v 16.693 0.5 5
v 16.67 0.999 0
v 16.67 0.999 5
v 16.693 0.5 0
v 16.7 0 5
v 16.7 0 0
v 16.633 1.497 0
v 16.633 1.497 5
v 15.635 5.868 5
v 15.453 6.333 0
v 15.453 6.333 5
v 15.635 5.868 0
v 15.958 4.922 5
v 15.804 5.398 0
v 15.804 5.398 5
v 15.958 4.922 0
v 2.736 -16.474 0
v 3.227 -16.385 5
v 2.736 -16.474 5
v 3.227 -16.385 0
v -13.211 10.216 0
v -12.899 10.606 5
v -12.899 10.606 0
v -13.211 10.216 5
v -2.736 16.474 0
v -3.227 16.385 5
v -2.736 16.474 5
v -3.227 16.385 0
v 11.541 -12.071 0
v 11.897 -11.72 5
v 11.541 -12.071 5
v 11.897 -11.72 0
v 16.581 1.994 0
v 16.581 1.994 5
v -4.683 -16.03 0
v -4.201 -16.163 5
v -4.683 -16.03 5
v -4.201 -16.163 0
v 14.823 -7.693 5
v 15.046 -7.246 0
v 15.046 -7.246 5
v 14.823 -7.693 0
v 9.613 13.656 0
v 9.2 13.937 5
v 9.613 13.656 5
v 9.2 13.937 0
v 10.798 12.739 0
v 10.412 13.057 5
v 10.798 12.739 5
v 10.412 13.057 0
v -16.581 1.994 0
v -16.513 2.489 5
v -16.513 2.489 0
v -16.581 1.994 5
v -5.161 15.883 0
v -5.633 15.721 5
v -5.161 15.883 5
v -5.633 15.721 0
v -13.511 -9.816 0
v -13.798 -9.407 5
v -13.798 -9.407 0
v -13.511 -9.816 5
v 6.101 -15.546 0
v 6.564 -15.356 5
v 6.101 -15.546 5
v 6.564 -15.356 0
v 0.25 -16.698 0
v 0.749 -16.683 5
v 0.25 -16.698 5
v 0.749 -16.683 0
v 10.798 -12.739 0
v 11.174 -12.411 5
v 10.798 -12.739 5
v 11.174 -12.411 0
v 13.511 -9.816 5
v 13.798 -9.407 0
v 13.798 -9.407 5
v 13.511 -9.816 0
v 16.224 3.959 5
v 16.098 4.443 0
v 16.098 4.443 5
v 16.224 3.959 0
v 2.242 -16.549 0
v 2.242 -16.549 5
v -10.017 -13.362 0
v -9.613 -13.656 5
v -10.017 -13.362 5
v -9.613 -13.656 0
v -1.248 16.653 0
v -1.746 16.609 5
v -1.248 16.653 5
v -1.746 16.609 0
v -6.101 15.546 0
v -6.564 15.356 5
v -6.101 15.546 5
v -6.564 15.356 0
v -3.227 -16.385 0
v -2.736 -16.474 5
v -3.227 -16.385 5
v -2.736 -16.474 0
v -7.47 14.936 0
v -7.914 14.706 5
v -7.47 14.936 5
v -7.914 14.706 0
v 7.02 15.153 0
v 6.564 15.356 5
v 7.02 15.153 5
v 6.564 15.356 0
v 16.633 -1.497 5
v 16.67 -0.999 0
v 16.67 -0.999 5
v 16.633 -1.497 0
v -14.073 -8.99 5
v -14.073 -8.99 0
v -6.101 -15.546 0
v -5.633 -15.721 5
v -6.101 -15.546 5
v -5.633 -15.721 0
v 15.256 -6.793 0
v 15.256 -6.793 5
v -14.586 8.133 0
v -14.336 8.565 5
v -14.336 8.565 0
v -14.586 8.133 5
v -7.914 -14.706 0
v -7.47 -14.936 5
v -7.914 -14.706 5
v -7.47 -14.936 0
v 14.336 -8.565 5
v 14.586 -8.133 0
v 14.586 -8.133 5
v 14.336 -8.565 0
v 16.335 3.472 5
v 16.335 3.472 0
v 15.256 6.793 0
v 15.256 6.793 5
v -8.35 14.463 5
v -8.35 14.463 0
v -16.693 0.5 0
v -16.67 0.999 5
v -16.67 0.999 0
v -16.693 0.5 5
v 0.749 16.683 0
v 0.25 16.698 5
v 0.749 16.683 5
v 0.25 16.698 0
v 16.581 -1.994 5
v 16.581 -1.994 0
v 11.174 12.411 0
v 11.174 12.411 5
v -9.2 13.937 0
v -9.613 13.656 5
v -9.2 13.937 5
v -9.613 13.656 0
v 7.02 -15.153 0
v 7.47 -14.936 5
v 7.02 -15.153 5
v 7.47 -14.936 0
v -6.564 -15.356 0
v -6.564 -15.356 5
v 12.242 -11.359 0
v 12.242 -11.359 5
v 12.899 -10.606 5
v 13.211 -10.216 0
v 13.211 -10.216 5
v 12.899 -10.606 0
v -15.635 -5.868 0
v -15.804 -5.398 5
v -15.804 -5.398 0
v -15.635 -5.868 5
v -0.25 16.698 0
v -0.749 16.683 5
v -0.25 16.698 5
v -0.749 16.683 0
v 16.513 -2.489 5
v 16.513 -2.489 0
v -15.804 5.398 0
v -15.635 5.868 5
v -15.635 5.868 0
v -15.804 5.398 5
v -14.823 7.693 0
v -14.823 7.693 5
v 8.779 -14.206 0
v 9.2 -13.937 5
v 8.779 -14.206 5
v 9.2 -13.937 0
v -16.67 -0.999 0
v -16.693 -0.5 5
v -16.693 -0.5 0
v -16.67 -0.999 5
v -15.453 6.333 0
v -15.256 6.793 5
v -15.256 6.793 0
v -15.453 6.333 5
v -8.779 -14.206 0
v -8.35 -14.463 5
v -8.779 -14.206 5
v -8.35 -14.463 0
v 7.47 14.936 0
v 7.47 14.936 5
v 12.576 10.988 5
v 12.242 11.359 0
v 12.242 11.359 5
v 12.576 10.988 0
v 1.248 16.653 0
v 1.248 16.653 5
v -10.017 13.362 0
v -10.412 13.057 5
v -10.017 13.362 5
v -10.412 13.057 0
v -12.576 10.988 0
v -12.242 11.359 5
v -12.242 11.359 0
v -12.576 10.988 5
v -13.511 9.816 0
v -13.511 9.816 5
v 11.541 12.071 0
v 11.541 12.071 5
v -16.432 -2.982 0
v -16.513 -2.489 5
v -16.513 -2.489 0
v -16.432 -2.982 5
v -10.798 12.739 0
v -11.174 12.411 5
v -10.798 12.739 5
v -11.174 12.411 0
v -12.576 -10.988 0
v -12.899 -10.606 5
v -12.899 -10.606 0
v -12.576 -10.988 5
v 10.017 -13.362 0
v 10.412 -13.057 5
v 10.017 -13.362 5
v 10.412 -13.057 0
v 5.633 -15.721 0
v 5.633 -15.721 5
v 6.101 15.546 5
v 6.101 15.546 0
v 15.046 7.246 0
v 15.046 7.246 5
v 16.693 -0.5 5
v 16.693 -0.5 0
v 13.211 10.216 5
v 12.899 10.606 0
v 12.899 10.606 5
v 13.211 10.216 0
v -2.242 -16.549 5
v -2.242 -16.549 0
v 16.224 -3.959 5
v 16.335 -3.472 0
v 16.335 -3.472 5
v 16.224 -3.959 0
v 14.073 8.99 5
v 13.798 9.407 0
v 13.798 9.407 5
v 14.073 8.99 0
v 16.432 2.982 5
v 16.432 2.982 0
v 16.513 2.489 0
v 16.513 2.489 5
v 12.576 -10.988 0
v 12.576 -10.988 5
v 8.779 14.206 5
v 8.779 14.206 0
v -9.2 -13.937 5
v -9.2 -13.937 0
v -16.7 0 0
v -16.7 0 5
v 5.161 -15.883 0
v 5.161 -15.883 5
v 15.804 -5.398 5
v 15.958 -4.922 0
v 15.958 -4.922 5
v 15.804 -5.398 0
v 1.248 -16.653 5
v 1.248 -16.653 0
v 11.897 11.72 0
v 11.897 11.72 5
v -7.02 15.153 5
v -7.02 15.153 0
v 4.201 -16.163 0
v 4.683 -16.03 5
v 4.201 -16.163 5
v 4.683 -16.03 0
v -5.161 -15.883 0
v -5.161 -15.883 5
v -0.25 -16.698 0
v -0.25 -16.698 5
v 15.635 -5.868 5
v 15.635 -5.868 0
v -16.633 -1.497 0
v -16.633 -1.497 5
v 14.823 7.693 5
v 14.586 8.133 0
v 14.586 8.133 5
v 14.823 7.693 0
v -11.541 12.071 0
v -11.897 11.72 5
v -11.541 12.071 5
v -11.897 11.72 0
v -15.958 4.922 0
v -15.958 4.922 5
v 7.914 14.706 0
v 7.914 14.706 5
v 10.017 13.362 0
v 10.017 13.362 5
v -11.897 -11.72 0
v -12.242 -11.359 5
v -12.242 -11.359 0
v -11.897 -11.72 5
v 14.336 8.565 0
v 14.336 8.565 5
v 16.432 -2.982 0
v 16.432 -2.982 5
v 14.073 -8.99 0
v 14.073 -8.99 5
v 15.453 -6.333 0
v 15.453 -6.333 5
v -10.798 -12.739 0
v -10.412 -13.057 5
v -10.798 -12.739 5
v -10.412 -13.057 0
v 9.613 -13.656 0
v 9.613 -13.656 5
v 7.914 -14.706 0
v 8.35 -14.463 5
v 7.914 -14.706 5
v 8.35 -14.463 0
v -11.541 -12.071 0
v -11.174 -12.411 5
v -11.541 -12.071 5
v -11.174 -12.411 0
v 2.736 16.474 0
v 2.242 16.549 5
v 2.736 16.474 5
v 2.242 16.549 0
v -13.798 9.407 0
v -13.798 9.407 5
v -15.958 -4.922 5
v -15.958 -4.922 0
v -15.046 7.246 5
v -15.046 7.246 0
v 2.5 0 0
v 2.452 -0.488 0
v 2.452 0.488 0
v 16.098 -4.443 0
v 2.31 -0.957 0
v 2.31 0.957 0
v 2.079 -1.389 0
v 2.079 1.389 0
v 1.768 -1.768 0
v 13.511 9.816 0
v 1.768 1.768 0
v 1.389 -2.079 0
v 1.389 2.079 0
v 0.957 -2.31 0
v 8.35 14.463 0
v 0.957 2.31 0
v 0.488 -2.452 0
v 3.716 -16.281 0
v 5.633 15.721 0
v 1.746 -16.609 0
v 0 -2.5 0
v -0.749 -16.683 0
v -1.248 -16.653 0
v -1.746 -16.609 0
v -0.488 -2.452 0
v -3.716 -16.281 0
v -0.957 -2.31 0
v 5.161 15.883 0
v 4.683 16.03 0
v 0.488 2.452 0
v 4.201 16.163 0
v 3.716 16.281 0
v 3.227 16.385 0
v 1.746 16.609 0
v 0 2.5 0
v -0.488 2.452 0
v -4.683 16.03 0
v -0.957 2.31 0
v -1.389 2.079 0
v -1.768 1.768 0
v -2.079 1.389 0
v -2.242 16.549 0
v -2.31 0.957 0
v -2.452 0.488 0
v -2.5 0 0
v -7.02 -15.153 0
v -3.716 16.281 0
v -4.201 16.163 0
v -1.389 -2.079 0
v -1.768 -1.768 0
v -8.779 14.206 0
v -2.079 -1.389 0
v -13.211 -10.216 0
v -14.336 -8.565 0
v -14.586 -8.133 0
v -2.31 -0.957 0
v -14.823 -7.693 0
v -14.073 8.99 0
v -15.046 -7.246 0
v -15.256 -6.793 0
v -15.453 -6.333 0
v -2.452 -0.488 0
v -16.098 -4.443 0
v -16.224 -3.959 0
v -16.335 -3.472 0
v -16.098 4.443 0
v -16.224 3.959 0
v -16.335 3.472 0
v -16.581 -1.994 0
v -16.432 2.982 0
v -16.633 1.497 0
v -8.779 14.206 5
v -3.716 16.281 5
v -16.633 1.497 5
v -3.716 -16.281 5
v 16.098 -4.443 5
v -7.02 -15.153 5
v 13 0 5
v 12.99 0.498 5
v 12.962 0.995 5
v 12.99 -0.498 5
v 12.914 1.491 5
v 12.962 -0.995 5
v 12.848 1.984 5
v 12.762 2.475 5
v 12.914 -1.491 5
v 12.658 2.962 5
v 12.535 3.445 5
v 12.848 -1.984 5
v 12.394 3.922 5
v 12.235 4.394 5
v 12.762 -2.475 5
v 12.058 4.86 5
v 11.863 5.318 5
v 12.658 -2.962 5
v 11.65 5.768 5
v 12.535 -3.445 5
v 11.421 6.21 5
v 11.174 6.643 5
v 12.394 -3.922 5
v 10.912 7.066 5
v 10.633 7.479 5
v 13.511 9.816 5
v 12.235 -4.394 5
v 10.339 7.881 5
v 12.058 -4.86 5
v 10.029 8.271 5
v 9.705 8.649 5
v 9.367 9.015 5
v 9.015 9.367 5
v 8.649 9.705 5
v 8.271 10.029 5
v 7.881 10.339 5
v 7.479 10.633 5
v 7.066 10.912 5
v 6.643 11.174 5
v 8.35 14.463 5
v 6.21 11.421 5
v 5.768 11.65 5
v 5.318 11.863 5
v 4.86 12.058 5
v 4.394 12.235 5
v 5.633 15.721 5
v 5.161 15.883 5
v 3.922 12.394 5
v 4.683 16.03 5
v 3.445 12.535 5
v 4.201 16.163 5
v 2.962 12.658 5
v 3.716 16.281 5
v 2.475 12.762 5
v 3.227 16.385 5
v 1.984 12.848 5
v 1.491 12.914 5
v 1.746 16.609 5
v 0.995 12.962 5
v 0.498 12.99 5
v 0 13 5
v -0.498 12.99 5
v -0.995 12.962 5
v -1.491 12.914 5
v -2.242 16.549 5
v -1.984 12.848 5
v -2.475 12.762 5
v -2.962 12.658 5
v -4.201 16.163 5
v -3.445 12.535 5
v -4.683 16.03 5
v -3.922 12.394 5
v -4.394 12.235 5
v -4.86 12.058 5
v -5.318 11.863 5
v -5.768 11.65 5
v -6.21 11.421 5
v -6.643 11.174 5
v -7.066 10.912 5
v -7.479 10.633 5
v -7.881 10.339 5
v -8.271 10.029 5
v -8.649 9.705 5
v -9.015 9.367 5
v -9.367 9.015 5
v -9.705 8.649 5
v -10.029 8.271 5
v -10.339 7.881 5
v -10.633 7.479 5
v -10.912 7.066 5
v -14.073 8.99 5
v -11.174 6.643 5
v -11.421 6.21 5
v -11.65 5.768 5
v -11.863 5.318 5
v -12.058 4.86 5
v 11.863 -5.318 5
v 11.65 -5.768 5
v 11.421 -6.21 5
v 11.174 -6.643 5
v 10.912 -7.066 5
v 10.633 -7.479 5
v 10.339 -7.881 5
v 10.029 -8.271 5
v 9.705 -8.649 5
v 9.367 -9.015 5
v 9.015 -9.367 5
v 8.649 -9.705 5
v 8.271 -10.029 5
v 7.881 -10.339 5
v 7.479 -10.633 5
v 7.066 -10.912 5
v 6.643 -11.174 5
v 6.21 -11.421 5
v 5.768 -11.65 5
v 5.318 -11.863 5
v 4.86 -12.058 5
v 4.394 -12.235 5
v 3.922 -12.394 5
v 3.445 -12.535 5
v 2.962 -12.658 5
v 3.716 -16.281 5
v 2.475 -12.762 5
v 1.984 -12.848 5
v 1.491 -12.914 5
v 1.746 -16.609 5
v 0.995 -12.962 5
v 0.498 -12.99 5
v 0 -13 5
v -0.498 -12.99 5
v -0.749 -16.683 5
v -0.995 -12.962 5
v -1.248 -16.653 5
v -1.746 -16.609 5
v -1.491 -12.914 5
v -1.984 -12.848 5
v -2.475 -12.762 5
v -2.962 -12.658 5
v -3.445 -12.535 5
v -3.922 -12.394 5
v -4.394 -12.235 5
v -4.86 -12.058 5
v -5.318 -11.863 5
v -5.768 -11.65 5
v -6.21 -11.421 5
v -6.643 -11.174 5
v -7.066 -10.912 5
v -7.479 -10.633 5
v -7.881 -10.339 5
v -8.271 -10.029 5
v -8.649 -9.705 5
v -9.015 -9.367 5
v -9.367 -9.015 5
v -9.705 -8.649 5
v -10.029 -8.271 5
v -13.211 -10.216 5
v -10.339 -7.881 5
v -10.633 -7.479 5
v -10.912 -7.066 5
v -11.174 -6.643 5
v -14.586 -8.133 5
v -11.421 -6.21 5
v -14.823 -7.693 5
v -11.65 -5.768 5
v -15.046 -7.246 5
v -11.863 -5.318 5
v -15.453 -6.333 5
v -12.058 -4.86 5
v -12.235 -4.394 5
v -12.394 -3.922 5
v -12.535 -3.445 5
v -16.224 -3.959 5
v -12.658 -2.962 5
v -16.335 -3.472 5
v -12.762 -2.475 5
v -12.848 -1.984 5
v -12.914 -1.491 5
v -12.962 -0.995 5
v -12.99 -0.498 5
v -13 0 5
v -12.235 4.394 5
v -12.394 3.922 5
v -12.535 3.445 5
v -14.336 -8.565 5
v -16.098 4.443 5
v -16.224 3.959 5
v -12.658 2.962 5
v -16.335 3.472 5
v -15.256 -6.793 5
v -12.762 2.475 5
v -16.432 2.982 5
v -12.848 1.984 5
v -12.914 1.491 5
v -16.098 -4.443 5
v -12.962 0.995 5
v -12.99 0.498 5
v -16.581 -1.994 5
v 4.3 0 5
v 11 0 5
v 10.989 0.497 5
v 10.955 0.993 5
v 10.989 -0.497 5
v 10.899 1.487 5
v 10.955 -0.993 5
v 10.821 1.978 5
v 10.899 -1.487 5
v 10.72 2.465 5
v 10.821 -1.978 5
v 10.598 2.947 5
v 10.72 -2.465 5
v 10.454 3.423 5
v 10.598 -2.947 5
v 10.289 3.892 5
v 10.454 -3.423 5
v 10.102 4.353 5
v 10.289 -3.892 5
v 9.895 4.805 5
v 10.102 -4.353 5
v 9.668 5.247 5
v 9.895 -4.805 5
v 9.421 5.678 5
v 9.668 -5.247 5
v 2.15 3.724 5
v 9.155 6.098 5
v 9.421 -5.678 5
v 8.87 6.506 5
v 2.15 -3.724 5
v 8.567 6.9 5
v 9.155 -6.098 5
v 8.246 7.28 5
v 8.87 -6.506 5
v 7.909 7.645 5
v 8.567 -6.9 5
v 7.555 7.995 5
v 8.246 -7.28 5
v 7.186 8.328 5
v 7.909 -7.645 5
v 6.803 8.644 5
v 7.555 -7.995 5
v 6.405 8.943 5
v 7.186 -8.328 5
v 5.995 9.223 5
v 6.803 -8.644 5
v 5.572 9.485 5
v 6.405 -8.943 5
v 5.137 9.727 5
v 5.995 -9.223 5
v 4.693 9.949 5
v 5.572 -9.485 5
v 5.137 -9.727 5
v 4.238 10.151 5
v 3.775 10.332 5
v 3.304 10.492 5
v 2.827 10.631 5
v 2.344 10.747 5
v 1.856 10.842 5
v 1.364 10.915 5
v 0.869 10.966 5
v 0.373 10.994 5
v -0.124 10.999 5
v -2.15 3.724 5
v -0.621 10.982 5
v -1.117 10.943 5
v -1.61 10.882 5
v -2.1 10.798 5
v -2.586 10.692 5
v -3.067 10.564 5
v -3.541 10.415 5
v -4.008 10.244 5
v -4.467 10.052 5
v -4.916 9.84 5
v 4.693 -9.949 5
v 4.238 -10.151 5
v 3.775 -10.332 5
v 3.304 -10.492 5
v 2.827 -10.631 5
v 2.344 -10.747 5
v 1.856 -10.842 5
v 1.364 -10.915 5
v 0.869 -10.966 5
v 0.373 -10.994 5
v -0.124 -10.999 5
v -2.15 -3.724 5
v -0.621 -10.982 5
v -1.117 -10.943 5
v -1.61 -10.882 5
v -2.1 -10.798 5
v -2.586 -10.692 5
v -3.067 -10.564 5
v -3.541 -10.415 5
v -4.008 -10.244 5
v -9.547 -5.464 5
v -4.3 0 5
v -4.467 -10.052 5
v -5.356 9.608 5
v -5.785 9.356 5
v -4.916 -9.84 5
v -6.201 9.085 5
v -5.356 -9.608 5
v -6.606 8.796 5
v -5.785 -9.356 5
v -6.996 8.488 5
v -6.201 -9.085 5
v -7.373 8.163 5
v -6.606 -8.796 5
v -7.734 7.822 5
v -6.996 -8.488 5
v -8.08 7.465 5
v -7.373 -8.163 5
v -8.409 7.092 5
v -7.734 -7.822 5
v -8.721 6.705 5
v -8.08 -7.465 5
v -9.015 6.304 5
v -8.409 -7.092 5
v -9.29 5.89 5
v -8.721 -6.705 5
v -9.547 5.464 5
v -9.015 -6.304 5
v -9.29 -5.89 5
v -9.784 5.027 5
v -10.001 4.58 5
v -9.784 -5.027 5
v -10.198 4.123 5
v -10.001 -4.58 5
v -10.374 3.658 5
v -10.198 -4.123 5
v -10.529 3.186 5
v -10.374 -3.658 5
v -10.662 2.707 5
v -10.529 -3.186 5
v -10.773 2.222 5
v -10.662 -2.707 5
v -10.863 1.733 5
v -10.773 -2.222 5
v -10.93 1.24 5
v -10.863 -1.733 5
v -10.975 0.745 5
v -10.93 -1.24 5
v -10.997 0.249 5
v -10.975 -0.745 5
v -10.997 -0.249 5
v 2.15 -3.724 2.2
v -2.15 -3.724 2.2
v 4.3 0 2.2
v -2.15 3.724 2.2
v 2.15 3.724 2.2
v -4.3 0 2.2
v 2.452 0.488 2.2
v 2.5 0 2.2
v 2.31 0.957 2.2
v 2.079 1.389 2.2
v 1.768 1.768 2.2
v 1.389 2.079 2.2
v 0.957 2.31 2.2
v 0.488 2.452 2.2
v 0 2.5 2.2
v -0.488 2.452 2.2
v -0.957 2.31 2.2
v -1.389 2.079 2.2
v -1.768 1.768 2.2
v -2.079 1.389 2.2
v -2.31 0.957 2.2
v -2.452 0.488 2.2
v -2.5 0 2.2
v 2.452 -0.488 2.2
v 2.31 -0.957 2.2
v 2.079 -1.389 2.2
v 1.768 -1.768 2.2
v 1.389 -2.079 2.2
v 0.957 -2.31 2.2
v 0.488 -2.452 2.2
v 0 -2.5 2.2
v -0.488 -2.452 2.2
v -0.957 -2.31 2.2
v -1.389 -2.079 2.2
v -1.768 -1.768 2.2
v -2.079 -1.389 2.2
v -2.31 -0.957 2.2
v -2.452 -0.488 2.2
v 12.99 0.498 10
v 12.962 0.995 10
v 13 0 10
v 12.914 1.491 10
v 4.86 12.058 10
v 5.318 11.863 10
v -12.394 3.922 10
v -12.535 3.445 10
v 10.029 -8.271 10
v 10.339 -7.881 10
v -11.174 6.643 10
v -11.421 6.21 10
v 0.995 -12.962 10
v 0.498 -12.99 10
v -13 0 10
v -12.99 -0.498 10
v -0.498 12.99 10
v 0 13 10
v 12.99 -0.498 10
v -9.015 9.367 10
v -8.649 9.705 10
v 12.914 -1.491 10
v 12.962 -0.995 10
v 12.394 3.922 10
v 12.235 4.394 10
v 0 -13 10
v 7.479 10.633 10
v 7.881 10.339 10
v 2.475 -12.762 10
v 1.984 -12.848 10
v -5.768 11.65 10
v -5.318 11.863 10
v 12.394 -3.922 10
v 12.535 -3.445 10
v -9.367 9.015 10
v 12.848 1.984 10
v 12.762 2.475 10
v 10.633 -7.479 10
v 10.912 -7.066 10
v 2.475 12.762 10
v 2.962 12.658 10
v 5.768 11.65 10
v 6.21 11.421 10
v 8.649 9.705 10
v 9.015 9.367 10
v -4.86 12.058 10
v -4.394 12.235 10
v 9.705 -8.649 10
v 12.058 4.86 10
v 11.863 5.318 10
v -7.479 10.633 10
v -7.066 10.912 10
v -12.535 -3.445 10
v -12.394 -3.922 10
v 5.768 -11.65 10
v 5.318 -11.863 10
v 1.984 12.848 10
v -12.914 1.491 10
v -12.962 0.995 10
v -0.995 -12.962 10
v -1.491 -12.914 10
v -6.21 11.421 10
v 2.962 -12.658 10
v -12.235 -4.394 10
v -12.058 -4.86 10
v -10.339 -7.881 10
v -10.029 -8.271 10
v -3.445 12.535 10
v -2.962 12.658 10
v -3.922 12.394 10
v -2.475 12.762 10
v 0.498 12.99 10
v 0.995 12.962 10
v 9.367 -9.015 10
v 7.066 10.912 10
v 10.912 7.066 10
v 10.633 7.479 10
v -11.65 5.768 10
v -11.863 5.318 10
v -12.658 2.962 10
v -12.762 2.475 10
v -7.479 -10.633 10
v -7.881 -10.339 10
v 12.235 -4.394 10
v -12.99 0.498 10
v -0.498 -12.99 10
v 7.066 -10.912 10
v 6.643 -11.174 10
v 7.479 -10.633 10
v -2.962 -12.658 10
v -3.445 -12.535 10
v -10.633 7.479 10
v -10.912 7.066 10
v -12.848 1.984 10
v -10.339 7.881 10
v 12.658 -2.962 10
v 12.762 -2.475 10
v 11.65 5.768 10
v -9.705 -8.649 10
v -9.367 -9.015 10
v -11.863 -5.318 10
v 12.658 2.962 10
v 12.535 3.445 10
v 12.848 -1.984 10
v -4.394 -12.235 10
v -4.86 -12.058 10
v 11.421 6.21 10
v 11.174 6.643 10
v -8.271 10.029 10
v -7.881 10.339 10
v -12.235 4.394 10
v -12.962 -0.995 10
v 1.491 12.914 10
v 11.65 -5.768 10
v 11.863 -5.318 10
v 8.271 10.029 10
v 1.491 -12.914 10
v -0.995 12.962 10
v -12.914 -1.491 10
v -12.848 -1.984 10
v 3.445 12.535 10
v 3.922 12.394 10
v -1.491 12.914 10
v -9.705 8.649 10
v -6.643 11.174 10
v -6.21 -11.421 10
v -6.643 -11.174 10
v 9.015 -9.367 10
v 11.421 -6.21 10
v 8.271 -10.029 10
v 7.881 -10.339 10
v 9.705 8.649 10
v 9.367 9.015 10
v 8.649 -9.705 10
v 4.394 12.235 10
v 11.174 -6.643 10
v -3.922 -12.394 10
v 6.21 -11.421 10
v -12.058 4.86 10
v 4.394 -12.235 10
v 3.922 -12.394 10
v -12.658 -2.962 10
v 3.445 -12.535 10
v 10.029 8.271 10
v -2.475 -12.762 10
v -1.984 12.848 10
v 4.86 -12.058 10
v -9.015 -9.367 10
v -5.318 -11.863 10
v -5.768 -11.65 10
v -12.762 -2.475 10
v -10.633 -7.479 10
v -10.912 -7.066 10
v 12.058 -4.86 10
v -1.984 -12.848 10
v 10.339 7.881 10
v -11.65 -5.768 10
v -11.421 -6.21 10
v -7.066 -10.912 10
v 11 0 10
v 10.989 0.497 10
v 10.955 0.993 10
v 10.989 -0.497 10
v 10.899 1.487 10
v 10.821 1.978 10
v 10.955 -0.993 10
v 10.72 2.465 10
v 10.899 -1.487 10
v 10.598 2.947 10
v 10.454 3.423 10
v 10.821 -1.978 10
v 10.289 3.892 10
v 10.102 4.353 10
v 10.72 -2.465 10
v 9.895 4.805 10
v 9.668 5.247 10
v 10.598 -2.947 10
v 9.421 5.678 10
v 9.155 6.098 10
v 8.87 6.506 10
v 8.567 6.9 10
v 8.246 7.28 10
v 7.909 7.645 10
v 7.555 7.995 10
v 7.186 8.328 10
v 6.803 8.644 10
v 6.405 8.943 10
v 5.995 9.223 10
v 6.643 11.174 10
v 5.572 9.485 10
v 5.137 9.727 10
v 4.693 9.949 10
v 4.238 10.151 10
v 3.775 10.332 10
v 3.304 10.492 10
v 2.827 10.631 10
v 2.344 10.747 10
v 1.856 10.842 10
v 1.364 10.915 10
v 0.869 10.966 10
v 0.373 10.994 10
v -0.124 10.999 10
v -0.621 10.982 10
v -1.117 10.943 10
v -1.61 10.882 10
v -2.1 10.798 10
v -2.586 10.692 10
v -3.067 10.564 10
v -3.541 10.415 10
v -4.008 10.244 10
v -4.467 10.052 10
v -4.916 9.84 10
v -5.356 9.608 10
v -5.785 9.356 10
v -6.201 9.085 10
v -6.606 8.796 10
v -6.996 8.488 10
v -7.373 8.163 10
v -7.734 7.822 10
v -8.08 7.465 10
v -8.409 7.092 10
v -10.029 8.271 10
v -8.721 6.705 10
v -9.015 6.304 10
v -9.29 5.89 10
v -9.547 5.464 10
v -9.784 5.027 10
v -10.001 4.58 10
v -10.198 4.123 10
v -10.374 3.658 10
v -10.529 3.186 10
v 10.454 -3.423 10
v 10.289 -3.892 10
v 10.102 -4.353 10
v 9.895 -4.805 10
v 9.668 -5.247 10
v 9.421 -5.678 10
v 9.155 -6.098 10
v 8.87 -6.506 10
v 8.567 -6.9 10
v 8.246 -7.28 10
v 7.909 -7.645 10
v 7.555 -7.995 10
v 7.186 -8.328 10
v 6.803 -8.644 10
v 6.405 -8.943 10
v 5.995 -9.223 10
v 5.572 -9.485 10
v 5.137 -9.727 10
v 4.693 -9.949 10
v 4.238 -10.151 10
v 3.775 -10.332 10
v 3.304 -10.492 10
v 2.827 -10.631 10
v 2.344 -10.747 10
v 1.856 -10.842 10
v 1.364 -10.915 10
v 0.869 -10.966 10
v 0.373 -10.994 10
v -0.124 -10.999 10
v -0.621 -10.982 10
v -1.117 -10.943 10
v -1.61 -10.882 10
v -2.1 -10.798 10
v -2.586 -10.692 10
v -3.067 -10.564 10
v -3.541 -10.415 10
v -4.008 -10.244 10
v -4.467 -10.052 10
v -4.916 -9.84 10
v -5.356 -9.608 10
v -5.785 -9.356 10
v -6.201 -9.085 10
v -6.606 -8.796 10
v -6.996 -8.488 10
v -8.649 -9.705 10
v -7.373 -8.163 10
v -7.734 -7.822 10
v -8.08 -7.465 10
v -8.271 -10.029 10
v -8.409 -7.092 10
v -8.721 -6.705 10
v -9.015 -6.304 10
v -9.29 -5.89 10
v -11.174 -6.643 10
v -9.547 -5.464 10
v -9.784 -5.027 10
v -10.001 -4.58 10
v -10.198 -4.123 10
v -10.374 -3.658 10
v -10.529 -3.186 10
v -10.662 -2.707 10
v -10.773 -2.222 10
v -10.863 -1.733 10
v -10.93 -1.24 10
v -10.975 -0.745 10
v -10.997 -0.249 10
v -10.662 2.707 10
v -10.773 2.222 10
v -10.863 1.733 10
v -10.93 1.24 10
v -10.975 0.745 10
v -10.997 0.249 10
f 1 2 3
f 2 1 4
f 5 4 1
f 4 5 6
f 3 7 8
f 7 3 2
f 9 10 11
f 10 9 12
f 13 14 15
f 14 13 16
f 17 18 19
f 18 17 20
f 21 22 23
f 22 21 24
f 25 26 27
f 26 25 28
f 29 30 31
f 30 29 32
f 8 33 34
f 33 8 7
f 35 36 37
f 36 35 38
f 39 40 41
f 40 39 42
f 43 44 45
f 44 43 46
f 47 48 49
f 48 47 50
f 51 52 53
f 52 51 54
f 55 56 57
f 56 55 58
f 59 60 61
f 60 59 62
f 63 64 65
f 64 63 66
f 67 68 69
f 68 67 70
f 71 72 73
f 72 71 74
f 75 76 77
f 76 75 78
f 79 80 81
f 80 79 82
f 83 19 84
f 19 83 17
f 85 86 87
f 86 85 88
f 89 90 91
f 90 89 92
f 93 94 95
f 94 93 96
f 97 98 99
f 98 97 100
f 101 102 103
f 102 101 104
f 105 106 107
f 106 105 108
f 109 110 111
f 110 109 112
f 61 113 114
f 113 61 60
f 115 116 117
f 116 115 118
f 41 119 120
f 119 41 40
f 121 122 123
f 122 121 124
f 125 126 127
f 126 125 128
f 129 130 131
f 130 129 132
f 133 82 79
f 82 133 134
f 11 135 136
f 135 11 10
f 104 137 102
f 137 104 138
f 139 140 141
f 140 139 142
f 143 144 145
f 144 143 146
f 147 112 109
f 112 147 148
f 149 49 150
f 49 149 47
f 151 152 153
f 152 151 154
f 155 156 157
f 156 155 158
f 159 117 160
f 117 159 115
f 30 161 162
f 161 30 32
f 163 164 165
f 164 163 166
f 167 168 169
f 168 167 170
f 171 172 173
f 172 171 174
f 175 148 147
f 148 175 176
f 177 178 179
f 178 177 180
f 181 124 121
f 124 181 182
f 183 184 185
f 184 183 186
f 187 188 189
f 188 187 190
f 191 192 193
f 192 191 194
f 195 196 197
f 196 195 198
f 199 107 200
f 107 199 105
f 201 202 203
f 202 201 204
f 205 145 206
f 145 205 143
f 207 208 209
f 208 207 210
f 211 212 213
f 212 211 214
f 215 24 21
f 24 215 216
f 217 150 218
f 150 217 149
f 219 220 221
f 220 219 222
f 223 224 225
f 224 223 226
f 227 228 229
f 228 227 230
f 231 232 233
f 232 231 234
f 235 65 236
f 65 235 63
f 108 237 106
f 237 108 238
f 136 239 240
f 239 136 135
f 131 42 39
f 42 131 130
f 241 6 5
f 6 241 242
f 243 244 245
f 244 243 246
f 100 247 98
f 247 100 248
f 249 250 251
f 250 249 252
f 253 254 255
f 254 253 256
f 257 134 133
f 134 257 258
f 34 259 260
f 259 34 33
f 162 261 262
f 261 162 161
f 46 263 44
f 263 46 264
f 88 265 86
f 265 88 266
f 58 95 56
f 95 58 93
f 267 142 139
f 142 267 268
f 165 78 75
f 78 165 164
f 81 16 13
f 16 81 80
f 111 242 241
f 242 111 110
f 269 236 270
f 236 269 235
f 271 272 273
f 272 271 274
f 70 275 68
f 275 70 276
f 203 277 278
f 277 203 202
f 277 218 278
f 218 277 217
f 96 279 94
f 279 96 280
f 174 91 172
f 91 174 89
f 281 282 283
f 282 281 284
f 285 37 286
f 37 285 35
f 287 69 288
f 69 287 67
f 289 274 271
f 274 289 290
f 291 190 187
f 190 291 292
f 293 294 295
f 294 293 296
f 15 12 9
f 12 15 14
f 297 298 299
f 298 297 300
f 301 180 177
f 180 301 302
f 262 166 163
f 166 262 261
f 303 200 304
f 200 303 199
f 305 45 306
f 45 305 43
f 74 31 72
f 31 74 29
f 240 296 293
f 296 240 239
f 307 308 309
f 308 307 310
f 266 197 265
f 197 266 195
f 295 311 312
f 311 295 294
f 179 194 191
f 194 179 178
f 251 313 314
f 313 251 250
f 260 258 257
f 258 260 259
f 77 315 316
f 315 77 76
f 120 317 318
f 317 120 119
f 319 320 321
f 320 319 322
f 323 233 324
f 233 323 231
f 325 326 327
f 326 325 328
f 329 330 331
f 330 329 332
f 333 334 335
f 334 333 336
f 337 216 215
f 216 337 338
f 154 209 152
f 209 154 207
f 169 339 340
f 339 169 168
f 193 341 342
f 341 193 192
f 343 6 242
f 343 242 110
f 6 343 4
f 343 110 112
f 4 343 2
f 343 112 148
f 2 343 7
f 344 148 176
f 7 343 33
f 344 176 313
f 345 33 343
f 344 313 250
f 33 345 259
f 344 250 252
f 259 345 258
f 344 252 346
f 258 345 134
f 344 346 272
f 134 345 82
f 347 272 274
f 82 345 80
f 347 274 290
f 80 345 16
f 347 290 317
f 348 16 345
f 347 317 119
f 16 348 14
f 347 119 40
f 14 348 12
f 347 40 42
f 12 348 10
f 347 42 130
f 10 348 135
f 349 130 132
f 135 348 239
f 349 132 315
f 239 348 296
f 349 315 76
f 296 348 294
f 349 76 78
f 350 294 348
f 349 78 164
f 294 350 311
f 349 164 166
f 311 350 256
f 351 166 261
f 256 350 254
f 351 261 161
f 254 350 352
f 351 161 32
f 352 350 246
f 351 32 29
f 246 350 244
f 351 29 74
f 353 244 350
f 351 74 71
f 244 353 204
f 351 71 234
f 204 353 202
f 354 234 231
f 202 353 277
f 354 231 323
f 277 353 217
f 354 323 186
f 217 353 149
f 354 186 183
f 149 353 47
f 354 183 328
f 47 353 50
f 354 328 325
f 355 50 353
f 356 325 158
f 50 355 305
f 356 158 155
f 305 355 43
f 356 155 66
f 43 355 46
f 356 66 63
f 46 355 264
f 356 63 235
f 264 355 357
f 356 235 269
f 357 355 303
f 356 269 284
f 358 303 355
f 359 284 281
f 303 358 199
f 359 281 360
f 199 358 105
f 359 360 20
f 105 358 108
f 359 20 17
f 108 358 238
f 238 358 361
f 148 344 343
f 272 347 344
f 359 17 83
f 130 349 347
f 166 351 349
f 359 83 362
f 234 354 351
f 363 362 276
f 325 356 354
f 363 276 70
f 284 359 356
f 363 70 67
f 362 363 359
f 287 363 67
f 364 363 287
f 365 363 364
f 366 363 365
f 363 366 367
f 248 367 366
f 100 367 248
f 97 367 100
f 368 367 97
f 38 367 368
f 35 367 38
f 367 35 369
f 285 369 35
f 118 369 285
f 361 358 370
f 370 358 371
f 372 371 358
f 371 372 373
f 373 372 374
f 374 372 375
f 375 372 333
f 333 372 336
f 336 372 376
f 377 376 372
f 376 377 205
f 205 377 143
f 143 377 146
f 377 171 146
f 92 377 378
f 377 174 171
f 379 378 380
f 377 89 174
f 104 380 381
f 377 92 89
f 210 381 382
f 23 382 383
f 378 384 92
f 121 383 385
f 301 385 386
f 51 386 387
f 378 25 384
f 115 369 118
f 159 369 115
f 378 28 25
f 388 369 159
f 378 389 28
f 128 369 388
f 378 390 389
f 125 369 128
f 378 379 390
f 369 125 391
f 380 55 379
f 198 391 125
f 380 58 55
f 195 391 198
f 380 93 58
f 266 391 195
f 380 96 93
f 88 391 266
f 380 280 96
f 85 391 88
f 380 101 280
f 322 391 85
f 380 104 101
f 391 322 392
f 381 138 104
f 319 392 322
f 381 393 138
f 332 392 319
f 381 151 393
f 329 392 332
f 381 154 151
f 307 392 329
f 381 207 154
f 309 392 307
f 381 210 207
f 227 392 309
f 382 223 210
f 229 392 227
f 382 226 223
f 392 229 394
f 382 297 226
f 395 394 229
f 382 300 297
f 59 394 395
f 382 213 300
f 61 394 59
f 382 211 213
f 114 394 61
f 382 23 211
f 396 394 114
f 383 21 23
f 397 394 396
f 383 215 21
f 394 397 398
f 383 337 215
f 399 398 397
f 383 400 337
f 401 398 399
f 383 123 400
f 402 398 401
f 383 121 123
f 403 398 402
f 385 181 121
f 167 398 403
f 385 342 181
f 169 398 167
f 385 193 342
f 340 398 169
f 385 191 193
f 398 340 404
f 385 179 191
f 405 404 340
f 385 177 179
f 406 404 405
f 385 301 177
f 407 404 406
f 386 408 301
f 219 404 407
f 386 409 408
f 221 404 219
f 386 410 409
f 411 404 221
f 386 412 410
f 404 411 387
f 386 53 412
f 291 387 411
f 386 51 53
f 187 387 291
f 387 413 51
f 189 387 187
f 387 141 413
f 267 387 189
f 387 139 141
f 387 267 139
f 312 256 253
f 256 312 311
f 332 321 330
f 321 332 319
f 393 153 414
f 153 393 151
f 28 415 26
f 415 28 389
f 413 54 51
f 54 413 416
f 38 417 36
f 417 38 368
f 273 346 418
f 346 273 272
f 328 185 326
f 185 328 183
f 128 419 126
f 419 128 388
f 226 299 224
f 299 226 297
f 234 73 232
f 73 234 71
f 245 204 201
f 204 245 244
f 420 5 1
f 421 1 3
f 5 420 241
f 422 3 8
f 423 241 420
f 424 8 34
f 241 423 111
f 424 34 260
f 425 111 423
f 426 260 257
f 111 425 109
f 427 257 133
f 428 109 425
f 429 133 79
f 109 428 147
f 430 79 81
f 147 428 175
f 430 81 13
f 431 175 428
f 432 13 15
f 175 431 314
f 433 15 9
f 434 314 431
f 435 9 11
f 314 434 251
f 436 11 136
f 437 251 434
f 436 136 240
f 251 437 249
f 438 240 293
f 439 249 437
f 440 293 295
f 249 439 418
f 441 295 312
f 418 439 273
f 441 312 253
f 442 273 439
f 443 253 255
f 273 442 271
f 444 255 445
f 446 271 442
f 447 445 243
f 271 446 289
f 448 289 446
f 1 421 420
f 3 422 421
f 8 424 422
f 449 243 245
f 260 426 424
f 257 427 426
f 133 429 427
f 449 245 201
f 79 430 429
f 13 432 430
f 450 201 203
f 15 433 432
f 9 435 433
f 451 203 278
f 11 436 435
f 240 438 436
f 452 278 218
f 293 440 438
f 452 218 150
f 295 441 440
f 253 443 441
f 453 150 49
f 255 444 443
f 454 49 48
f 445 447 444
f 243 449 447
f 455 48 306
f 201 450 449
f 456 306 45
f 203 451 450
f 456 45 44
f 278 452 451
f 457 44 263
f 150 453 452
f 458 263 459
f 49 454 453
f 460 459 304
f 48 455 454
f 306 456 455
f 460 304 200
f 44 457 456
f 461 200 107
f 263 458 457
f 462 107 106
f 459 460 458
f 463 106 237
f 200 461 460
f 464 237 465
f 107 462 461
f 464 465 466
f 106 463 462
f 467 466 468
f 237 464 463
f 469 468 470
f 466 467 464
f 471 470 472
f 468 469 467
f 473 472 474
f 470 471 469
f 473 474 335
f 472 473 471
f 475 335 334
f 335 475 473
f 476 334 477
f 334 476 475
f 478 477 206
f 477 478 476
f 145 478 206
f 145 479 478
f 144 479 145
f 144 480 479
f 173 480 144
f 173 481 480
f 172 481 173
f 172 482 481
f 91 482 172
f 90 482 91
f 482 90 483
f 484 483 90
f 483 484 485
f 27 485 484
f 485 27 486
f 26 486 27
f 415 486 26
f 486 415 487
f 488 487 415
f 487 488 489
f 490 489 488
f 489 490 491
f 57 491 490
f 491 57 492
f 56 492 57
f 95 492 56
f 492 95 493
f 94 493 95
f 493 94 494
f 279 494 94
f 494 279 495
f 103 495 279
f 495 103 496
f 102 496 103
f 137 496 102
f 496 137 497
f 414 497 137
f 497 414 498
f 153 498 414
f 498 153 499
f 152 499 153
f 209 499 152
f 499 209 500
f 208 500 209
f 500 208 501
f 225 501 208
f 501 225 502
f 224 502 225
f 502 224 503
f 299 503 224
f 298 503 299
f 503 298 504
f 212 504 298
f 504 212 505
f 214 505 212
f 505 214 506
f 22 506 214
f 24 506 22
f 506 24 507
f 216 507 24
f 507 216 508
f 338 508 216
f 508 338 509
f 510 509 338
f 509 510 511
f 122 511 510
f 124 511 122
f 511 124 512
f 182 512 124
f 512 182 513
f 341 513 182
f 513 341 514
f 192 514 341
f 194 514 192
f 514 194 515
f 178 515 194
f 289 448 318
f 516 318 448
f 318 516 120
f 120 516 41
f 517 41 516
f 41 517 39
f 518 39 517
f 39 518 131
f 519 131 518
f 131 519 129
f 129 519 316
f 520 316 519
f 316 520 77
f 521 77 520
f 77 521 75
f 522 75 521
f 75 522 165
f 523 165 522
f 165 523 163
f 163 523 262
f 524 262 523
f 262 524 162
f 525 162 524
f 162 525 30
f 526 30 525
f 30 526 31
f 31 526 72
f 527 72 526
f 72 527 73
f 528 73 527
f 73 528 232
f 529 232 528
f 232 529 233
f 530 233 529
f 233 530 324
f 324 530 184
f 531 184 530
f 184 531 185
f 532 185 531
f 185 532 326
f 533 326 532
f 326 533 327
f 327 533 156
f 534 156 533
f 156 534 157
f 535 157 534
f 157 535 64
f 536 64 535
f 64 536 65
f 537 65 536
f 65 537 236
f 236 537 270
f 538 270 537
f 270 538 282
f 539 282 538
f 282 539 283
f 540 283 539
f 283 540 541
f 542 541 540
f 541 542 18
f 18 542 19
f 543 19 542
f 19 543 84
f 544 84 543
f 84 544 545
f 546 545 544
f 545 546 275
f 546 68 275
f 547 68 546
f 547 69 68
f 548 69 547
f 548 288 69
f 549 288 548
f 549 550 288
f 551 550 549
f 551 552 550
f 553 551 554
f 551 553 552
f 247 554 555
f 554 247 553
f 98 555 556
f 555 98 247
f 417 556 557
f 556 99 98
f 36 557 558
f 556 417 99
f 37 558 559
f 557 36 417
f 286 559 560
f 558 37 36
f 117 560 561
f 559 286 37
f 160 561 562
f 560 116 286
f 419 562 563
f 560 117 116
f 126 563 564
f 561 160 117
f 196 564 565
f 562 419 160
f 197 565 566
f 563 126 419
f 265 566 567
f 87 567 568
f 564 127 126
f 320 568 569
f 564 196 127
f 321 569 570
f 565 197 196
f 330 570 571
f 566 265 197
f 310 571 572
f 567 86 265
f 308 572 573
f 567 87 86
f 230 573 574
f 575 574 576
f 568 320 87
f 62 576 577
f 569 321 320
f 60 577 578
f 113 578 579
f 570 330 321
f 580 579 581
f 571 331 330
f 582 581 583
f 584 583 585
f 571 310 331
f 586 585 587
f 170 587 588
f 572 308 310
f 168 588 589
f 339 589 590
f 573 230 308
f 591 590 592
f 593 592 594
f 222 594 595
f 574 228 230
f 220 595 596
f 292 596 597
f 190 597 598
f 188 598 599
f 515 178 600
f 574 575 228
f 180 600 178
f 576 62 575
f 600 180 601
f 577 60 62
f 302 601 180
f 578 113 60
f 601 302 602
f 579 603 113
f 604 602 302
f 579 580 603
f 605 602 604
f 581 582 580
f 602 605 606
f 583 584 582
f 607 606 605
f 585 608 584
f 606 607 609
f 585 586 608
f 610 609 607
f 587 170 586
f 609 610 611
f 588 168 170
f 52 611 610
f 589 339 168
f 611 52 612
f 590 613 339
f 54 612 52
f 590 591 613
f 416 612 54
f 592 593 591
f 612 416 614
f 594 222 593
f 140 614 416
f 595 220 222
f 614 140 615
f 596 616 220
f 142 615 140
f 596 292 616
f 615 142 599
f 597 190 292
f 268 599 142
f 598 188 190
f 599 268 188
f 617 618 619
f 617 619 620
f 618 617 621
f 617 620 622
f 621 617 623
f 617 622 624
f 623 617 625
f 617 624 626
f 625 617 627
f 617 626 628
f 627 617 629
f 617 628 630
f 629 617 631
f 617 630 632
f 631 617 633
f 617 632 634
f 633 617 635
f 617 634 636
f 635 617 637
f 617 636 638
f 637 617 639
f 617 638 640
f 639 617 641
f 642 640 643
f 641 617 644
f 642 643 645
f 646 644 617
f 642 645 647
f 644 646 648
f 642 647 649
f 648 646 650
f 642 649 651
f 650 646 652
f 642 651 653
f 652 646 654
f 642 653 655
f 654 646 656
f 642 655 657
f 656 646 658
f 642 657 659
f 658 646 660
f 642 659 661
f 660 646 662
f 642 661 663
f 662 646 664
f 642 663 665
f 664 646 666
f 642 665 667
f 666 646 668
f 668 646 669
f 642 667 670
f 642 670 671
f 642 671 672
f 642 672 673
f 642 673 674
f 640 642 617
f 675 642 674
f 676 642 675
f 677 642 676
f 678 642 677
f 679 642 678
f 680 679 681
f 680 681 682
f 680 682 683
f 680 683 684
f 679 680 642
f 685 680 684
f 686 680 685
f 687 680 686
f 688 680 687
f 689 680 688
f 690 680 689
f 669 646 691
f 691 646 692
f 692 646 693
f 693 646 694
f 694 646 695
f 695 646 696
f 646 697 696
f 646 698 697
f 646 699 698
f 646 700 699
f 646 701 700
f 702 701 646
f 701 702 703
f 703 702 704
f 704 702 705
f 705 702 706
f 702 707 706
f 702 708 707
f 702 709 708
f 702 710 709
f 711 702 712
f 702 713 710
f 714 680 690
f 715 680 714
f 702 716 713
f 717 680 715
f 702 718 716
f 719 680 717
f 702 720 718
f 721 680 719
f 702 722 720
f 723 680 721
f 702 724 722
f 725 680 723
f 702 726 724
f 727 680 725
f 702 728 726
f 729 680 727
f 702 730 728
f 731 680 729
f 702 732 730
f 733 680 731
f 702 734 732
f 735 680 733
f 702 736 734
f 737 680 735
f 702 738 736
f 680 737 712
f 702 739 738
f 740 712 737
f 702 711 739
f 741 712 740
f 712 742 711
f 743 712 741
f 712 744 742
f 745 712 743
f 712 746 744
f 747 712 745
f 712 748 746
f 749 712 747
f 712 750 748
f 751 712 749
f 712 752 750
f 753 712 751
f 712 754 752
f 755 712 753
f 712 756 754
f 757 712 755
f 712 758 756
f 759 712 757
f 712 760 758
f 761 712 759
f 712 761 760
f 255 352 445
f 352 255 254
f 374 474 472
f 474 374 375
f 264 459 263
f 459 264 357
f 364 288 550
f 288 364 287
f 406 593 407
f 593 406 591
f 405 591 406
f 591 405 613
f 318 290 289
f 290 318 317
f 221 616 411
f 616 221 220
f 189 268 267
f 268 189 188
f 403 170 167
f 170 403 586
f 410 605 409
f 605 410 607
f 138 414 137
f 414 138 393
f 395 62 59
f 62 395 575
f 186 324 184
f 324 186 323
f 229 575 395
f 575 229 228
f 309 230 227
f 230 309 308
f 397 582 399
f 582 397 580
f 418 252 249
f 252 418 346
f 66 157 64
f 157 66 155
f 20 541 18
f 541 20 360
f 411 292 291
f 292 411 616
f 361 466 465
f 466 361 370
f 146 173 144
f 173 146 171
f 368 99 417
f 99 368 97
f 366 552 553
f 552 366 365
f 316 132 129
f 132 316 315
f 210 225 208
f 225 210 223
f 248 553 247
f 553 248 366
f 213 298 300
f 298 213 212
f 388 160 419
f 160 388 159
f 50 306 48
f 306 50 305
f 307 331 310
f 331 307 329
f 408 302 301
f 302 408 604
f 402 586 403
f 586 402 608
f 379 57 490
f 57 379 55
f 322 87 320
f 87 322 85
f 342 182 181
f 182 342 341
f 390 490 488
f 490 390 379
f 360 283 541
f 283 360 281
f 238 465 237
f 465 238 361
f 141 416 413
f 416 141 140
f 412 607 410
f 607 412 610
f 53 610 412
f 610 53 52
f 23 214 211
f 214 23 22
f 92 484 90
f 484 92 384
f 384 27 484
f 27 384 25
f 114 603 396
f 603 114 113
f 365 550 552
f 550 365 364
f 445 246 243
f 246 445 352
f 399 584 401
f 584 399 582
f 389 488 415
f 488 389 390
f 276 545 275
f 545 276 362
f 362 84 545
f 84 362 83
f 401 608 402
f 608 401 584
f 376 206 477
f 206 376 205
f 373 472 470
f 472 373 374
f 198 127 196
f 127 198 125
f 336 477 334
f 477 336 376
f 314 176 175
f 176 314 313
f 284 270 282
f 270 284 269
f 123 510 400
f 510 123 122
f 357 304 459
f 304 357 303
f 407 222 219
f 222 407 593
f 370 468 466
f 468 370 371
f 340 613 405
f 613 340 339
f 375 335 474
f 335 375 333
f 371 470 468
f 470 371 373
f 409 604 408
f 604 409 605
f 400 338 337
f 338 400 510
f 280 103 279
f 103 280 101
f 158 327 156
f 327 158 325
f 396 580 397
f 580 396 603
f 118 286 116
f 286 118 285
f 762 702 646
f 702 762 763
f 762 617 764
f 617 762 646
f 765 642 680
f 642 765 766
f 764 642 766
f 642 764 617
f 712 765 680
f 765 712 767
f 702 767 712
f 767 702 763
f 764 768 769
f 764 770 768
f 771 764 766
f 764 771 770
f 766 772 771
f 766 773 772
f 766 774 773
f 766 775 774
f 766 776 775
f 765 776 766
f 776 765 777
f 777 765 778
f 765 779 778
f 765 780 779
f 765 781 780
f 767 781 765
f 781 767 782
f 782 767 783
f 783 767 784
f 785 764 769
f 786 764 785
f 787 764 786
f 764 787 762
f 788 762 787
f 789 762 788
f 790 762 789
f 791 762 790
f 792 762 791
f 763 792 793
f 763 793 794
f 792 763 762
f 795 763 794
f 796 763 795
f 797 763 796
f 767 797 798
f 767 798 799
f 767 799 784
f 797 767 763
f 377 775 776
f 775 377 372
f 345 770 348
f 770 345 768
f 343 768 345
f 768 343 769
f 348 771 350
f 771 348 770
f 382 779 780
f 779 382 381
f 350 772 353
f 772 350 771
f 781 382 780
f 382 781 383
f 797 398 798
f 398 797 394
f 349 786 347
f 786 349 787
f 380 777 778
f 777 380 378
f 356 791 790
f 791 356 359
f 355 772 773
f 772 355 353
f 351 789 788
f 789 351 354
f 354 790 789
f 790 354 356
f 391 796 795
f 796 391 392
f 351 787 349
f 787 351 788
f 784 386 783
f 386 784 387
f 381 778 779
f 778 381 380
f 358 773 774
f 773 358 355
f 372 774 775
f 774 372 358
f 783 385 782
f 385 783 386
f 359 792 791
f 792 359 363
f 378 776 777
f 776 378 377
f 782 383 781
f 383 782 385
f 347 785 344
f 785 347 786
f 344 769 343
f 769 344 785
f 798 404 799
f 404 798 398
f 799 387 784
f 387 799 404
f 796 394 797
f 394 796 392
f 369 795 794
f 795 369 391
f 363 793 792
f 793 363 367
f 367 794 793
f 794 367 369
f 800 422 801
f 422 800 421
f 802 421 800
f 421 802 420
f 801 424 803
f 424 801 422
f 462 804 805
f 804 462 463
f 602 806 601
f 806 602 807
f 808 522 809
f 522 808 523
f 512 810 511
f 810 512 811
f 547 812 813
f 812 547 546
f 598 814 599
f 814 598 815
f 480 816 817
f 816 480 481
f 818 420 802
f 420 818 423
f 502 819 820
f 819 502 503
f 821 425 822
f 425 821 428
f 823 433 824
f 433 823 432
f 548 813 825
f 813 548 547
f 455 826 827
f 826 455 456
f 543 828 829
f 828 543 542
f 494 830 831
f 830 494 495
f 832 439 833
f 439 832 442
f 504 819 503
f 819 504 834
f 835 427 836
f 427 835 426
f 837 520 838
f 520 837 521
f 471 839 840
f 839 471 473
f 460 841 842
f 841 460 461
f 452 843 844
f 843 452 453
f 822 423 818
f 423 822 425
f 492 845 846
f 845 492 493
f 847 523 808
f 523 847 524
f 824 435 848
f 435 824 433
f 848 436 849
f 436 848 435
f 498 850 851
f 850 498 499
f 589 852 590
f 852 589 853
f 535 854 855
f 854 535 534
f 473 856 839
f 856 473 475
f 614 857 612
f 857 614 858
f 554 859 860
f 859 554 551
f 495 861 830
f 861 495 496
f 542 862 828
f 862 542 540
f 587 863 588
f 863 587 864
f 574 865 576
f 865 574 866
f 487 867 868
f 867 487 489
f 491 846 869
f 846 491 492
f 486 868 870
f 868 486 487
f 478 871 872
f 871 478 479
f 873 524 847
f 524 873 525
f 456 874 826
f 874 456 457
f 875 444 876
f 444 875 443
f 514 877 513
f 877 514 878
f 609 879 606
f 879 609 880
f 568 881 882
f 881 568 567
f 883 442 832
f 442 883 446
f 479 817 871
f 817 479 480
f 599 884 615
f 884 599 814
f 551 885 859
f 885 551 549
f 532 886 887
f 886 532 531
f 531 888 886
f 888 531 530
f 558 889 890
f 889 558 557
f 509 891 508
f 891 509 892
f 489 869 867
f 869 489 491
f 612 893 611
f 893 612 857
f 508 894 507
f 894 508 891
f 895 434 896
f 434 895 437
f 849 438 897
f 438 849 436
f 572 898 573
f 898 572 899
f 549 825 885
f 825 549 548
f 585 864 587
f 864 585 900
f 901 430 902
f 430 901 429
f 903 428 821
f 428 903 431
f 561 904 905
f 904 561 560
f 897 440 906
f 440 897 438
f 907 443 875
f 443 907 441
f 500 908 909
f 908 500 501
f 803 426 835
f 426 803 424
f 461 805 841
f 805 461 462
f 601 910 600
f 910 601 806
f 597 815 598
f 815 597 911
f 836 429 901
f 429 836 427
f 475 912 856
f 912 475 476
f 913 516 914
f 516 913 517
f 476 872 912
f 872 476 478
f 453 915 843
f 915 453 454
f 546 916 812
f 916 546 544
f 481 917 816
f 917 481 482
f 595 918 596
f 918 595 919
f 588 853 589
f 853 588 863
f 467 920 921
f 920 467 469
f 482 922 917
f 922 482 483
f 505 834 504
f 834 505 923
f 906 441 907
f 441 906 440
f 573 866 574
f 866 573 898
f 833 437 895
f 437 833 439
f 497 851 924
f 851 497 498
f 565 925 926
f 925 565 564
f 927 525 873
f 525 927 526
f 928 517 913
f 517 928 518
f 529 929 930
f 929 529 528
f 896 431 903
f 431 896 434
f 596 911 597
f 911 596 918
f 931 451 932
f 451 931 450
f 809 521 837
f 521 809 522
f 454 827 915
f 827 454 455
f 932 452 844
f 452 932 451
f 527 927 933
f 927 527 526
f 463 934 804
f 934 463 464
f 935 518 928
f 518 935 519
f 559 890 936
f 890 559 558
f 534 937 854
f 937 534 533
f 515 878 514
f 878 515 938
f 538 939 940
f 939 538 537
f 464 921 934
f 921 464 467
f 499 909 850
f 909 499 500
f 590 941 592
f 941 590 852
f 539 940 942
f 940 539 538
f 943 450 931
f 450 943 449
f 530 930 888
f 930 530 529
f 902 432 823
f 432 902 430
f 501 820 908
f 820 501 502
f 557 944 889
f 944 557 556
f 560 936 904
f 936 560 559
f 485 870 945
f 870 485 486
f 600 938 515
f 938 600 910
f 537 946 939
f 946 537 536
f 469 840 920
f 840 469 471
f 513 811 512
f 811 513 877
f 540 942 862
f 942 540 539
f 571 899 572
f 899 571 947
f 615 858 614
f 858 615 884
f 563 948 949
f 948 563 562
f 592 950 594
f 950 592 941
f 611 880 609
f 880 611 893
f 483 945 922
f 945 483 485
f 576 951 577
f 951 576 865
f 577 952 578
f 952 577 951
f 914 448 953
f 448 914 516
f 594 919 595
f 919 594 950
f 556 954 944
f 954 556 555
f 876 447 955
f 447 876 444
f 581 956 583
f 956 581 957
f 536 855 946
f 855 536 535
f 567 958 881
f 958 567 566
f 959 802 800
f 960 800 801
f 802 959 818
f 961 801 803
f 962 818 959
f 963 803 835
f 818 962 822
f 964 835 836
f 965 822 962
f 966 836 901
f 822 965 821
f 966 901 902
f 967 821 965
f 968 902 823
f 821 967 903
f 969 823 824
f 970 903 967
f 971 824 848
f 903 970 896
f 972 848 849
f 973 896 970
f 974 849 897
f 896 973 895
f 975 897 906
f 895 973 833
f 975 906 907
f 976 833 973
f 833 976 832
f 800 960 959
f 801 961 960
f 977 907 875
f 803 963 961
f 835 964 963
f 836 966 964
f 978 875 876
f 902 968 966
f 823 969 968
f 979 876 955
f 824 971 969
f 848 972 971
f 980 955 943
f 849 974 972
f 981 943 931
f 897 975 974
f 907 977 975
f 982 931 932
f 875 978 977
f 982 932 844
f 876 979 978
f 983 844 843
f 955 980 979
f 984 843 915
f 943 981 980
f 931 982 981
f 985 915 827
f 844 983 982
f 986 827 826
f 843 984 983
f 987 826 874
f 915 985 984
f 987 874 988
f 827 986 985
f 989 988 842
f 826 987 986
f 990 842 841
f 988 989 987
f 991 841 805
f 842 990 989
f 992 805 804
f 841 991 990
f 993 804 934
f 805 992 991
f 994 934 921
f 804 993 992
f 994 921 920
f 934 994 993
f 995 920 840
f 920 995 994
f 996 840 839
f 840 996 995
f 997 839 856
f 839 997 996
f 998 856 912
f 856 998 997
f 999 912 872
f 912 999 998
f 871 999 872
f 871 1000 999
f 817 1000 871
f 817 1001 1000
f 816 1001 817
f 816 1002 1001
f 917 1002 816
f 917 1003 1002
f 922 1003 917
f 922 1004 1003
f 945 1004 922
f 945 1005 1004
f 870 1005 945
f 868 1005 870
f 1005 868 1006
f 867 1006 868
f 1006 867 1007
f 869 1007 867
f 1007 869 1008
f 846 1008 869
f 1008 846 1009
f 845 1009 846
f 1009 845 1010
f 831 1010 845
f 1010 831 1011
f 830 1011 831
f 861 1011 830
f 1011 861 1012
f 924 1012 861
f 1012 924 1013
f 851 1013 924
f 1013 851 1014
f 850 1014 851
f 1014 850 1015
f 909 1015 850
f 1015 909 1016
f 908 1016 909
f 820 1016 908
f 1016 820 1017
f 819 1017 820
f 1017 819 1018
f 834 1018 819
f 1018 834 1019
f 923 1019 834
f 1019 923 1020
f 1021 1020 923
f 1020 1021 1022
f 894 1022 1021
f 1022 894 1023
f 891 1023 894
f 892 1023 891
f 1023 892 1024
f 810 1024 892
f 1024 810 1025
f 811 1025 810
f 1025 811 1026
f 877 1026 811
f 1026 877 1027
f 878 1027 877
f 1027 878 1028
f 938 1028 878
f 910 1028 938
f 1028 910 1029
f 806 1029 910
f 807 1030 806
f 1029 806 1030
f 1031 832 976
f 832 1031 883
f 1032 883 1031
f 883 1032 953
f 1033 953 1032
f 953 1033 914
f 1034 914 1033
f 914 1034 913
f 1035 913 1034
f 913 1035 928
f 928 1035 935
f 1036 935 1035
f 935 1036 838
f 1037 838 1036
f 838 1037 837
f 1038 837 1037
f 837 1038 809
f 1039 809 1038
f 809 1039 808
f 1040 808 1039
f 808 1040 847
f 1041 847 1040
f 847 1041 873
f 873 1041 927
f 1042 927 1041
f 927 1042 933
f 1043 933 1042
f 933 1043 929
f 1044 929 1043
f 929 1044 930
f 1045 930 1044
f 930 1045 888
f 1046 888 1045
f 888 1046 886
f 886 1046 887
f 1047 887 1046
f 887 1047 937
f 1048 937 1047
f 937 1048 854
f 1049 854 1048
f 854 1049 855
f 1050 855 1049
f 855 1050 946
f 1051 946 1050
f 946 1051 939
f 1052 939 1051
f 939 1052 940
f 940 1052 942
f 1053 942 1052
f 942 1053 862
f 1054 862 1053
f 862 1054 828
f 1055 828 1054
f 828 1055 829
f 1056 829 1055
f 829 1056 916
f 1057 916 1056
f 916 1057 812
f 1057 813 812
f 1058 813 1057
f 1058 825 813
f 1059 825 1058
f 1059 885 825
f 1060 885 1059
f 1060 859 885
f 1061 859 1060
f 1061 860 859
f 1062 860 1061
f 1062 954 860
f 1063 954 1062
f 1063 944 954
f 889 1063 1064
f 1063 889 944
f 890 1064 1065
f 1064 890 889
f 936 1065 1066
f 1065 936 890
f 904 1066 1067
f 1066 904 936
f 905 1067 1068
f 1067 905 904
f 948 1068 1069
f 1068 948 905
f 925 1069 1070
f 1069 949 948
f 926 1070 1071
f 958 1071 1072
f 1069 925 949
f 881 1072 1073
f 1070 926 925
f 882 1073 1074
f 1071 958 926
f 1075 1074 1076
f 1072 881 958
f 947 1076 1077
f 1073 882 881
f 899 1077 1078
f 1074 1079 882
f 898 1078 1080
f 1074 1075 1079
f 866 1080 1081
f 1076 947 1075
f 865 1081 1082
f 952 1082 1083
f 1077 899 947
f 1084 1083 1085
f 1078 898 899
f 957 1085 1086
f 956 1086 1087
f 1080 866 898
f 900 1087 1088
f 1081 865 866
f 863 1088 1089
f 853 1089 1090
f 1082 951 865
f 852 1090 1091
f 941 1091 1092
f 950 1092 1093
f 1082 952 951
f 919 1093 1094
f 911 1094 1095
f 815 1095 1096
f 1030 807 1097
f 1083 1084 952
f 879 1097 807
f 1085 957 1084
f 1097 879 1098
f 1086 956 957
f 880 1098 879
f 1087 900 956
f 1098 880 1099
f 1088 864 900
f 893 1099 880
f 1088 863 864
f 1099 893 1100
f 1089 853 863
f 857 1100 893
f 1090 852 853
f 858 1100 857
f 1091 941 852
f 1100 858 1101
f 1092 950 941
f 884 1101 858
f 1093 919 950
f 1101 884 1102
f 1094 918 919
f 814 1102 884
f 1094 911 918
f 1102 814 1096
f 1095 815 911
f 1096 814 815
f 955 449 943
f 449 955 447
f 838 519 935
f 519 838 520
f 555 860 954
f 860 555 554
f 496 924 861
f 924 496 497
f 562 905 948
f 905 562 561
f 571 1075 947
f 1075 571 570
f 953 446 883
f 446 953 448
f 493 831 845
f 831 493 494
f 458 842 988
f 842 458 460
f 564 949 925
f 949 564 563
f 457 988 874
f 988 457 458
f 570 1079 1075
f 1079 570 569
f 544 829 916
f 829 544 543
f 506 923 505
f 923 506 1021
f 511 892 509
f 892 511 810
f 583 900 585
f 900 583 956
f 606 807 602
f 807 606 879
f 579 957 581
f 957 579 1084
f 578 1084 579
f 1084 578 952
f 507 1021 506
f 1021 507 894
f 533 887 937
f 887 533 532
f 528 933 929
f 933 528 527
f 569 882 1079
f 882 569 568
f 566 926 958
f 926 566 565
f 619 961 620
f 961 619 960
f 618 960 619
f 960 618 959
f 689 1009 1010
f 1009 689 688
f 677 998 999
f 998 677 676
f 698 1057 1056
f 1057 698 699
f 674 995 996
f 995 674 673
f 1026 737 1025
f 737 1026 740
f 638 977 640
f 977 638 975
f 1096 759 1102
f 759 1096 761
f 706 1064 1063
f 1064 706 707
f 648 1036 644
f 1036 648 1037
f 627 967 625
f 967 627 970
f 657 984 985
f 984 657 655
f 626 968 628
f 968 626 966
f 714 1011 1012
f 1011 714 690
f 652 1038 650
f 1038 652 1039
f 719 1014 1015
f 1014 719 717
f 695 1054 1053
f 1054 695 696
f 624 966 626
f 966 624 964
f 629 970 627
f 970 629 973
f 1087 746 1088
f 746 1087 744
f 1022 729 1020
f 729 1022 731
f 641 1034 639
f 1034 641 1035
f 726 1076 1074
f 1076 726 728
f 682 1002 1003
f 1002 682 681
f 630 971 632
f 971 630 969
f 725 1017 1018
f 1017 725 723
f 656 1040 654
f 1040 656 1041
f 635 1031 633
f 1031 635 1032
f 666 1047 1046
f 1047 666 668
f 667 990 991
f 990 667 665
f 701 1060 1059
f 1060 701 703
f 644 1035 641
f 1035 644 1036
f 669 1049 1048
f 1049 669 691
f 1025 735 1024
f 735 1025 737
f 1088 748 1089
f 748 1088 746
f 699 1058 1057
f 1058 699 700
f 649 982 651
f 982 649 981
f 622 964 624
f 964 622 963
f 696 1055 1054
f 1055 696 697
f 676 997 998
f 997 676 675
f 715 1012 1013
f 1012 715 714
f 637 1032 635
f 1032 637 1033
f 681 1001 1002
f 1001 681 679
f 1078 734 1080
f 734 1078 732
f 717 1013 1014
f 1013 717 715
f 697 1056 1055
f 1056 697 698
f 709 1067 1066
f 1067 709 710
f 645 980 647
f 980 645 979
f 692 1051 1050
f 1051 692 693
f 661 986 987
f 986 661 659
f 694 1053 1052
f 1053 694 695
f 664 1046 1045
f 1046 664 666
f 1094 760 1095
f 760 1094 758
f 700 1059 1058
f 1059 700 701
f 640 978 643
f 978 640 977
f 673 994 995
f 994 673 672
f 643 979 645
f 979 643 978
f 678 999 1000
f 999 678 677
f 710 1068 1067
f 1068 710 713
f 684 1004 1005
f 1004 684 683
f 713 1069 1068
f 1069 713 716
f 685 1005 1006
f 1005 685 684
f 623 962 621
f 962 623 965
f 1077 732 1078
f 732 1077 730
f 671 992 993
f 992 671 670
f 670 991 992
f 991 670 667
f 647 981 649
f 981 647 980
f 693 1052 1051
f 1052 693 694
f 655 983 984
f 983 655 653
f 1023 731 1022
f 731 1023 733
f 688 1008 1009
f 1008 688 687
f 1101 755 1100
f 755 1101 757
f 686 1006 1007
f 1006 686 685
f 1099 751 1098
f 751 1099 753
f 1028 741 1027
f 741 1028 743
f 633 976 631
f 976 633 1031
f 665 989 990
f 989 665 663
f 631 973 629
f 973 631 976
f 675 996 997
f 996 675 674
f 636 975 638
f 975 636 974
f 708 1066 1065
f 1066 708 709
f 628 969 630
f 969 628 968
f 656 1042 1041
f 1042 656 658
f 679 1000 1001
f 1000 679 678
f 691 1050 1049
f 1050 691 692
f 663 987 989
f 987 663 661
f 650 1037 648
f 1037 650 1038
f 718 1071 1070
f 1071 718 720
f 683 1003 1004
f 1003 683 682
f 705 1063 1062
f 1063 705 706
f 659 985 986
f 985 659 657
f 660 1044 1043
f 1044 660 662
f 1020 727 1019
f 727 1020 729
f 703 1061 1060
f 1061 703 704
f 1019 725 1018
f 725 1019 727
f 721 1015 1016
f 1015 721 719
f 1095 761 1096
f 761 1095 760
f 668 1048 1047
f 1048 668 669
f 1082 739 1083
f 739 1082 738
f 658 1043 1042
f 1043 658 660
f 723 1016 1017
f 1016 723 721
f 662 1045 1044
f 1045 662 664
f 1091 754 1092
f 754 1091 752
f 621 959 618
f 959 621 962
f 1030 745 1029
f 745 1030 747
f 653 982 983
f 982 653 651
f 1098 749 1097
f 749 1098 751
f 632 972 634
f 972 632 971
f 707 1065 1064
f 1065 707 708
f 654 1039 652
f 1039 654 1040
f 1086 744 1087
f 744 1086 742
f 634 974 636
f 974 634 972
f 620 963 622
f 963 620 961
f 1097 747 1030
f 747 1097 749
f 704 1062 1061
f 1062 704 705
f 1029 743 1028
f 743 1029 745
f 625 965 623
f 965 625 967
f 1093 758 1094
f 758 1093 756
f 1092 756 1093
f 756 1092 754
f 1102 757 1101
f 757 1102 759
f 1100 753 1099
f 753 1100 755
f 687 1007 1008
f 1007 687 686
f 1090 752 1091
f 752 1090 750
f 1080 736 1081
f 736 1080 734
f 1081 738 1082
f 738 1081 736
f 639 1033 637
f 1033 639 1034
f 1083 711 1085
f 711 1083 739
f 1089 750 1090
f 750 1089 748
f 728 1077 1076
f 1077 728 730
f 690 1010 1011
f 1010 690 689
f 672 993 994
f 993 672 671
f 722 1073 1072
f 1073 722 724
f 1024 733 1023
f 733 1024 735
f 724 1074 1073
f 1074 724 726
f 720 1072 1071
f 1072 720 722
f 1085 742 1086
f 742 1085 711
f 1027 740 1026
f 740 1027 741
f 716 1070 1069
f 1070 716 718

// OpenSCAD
$fa=0.5; // default minimum facet angle is now 0.5
$fs=0.5; // default minimum facet size is now 0.5 mm

tube_d = 26;
tube_tickness = 2;
tube_height = 5;

tube_base = 5;
tube_border = 3.7;

bolt_d = 8.6;
bolt_depth = 2.8;

screw_d = 5;


// floor
difference() {
    translate([0, 0, 0]) cylinder(d = tube_d + 2 * tube_border, h = tube_base);
    translate([0, 0, tube_base - bolt_depth]) cylinder(d=bolt_d, h=bolt_depth+1, $fn=6);
    translate([0, 0, -1]) cylinder(d = screw_d, h = tube_base + 2);
}
difference() {
    translate([0, 0, tube_base]) cylinder(d = tube_d, h = tube_height);
    translate([0, 0, tube_base-1]) cylinder(d = tube_d - tube_tickness * 2, h = tube_height+2);
}
